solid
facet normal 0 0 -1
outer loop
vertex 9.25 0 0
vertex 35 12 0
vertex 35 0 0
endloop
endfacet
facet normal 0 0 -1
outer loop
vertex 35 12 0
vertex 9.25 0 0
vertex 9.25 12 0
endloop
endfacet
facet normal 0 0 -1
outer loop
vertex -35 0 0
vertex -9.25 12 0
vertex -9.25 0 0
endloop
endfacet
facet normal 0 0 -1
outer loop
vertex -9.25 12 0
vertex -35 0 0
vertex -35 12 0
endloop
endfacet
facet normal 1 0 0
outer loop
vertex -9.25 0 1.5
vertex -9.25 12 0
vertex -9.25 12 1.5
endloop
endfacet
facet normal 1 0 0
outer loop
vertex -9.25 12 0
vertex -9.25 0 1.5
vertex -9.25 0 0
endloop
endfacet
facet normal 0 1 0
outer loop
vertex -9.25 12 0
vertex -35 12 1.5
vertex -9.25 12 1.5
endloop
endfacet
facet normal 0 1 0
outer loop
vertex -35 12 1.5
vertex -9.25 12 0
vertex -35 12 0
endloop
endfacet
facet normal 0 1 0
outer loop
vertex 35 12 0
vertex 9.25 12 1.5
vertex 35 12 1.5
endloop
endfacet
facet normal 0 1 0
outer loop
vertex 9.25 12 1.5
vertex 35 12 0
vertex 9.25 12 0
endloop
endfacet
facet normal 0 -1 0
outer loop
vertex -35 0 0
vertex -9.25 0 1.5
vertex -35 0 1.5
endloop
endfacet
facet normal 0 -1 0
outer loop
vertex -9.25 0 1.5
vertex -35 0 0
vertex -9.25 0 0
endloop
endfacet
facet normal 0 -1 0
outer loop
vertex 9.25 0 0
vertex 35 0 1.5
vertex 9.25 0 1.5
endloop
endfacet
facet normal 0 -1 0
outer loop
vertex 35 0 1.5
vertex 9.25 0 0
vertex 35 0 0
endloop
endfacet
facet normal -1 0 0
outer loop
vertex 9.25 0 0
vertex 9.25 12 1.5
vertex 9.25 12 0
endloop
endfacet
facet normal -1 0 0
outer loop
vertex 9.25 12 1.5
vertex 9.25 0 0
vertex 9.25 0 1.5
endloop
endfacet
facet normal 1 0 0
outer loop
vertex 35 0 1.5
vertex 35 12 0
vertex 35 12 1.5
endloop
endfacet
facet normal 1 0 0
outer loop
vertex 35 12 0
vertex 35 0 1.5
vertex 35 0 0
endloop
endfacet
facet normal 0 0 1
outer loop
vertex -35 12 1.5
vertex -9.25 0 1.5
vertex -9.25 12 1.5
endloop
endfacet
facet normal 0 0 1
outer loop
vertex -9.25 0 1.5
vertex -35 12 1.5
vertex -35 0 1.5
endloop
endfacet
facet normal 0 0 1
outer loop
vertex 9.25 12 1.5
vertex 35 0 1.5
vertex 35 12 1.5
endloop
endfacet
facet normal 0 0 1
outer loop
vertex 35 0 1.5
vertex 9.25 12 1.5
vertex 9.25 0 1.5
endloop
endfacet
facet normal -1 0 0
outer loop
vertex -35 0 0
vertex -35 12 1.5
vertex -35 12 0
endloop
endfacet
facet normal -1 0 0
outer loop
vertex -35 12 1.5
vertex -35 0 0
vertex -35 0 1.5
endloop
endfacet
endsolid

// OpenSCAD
// 10-well comb for agarose gel casting
// Print orientation: flat on bed, teeth pointing down (-Z)

// ---------- Parameters ----------
plate_len    = 70;    // spine length (X)
plate_wid    = 12;    // spine width (Y)
plate_t      = 1.5;   // plate thickness (Z)

tooth_count  = 10;    // number of teeth
tooth_w      = 5.0;   // tooth width (X)
tooth_len    = 12;    // tooth length (Y)
tooth_pitch  = 1.5;   // gap between teeth (X)

eps          = 0.5;   // overcut for clean booleans

$fn = 64;

// ---------- Derived ----------
spine_h = plate_wid + tooth_count * tooth_len + (tooth_count - 1) * tooth_pitch;

// ---------- Model ----------
difference() {
    // Flat plate
    translate([-plate_len/2, 0, 0])
        cube([plate_len, plate_wid, plate_t]);

    // Teeth, centred on spine in X
    for (i = [0 : tooth_count - 1]) {
        x = (i - (tooth_count - 1)/2) * tooth_pitch;
        translate([x - tooth_w/2, 0, 0])
            cube([tooth_w, tooth_len, tooth_pitch + eps]);
    }
}
